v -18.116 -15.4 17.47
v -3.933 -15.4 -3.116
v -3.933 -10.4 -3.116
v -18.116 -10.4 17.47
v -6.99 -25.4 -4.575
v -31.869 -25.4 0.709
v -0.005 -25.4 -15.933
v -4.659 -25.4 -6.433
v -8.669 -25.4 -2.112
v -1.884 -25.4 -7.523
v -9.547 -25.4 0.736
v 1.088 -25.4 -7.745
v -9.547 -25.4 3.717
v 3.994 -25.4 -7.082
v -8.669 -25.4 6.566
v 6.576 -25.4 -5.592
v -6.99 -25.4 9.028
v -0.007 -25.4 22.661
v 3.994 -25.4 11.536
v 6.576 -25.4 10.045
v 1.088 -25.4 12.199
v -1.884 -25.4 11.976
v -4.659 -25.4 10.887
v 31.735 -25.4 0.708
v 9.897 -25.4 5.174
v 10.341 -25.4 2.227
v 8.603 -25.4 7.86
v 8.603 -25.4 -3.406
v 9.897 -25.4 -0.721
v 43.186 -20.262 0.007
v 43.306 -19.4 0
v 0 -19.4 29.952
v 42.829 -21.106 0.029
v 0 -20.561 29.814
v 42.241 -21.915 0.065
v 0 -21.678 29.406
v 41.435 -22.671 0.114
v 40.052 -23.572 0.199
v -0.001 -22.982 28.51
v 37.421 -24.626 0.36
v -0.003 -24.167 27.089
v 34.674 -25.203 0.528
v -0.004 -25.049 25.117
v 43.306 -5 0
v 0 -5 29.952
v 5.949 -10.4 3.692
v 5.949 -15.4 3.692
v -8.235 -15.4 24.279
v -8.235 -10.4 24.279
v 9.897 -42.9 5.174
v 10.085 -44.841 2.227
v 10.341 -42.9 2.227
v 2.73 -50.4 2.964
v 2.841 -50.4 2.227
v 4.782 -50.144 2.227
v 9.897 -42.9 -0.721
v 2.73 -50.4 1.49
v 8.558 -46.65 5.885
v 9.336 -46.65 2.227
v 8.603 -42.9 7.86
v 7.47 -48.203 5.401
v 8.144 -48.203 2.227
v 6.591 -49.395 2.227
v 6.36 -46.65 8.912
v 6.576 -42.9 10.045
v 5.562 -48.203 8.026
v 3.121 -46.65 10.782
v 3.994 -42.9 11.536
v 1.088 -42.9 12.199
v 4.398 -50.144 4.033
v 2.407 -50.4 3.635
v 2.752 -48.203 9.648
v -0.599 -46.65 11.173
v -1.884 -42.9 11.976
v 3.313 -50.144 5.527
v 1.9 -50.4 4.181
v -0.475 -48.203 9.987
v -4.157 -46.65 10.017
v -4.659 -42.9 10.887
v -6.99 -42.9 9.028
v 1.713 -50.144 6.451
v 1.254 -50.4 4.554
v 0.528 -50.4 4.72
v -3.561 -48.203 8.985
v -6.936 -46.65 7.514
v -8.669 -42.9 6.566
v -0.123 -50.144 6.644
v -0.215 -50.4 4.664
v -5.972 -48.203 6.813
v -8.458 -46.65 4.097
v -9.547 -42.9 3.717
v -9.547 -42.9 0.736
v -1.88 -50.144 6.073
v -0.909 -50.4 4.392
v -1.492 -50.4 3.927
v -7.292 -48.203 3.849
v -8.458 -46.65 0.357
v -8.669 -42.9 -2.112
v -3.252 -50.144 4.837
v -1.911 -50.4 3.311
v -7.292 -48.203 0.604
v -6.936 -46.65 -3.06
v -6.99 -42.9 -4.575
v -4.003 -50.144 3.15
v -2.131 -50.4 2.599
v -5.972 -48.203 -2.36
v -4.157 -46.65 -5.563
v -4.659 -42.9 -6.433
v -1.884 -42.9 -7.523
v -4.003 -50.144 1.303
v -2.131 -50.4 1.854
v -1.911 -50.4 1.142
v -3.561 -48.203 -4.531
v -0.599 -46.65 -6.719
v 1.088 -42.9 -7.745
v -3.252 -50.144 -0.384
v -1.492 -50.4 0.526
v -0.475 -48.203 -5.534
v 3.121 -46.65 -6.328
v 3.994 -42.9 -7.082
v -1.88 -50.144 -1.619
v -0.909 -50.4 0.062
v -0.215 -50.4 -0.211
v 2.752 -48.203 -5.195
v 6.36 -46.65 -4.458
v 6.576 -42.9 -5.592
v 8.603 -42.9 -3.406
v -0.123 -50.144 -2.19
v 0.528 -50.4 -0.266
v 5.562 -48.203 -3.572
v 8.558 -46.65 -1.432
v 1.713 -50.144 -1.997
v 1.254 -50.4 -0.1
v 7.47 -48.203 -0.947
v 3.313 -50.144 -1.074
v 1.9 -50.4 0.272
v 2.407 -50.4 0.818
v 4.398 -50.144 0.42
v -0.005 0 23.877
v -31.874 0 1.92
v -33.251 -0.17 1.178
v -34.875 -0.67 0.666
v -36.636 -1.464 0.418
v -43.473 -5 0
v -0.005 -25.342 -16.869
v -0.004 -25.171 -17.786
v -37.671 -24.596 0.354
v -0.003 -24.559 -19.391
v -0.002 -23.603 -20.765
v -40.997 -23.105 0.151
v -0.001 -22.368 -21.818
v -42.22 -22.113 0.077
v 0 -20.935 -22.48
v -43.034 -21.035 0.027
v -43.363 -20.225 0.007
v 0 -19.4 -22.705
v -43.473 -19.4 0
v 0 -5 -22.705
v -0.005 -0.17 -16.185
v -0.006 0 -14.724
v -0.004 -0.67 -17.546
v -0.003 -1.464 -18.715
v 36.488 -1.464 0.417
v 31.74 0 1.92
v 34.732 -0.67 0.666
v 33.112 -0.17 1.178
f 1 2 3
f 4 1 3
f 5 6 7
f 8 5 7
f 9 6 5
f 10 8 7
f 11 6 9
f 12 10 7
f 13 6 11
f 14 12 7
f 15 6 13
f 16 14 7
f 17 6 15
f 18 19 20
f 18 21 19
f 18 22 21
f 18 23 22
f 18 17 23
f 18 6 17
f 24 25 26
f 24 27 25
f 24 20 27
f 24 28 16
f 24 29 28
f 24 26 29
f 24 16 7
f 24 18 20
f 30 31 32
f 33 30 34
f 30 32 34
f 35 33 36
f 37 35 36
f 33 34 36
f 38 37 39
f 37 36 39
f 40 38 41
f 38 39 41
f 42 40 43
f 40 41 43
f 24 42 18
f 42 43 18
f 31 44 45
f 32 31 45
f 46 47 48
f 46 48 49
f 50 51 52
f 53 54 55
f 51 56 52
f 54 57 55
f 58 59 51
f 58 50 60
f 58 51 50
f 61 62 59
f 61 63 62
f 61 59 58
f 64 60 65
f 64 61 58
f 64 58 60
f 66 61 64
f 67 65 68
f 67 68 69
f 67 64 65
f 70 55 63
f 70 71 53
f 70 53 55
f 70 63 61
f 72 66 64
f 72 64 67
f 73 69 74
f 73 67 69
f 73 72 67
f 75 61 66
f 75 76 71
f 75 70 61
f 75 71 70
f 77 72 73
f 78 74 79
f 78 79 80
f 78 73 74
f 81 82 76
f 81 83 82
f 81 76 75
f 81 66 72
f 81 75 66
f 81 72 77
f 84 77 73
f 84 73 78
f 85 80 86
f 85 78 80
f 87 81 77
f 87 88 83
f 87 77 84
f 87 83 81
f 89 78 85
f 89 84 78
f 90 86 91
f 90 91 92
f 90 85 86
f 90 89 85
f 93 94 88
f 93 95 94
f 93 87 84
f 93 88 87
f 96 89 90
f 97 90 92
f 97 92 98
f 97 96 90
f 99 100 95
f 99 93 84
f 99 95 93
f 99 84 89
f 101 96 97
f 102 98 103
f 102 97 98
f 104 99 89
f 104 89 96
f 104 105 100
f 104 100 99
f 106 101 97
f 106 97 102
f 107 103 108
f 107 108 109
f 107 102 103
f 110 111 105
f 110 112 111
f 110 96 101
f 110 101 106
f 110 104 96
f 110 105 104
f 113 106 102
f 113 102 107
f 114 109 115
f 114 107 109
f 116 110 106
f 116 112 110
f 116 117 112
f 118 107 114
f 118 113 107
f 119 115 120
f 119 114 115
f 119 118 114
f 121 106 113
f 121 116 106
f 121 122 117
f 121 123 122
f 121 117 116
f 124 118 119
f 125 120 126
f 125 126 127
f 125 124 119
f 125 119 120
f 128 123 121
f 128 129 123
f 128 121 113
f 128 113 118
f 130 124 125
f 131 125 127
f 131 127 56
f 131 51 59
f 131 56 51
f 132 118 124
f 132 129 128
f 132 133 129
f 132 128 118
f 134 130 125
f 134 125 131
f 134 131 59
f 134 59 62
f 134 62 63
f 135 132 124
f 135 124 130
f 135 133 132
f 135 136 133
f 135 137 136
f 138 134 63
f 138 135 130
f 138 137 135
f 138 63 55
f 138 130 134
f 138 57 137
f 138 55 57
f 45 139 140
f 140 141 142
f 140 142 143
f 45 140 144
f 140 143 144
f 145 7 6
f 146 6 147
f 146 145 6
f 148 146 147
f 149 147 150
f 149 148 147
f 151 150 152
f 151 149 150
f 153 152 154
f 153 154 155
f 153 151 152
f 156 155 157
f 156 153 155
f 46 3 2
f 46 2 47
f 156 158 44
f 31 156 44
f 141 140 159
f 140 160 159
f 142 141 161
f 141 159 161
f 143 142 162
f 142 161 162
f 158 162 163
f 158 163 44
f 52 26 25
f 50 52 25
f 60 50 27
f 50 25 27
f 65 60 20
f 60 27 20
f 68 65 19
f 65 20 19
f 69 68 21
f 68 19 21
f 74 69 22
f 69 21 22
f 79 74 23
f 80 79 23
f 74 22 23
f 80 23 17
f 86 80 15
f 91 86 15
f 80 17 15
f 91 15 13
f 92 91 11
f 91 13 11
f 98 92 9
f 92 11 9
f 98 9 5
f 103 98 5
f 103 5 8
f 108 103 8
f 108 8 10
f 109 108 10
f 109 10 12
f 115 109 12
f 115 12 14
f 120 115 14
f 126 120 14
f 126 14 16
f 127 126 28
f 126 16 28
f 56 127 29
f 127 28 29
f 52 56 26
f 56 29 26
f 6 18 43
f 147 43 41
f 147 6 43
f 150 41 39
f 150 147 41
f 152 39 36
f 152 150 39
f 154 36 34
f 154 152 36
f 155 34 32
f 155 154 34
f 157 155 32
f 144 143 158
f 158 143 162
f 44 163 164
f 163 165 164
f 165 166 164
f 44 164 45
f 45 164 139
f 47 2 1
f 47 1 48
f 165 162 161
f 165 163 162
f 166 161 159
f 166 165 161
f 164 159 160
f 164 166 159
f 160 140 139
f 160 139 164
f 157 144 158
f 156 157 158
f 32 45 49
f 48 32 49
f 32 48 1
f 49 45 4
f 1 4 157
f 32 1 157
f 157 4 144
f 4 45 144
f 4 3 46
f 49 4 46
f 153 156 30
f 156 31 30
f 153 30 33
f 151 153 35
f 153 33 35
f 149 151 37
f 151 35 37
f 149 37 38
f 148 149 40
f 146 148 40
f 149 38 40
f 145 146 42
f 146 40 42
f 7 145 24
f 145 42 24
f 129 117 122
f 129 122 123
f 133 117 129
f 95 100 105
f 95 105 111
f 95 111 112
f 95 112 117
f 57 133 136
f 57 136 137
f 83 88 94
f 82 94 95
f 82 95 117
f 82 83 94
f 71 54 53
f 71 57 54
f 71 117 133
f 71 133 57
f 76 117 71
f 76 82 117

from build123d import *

# Parameters (mm, degrees)
F1_DEPTH = 25.4
F2_SIZE  = 5
F3_R     = 6
F4_W     = 12
F4_H     = 5
F5_DEPTH = 25
F6_R     = 5
F7_R     = 10
F8_DEPTH = 25
F9_R     = 7.5


with BuildPart() as f1:
    # F0 (on Front) → F1 (new body)
    with BuildSketch(Plane.XZ):
        Polygon((43.3064028621, 0), (0, 29.9521442503), (-43.4733256698, 0), (0, -22.7049794048), align=None)
    extrude(amount=F1_DEPTH)

    # F2
    f2_edges = [f1.edges().sort_by_distance(p)[0] for p in [
        (-21.736663, 0, 14.976072),
        (-21.736663, 0, -11.35249),
        (21.653201, 0, -11.35249),
        (21.653201, 0, 14.976072),
    ]]
    chamfer(f2_edges, length=F2_SIZE)

    # F3
    f3_edges = [f1.edges().sort_by_distance(p)[0] for p in [
        (-21.736663, -25.4, 14.976072),
        (21.653201, -25.4, 14.976072),
        (21.653201, -25.4, -11.35249),
        (-21.736663, -25.4, -11.35249),
    ]]
    fillet(f3_edges, radius=F3_R)

    # F4 (on face) → F5 (cut)
    with BuildSketch(Plane(origin=(-13.9936893699, 0, 20.3108068062), x_dir=(0.8234735009, 0, 0.5673547332), z_dir=(-0.5673547332, 0, 0.8234735009))):
        with Locations((0.9934908095, -12.9)):
            Rectangle(F4_W, F4_H)
    extrude(amount=-F5_DEPTH, mode=Mode.SUBTRACT)

    # F6
    f6_edges = [f1.edges().sort_by_distance(p)[0] for p in [
        (-16.903935, 0, -8.235641),
        (16.829559, 0, -8.23594),
    ]]
    fillet(f6_edges, radius=F6_R)

    # F7 (on face) → F8 (join)
    with BuildSketch(Plane.XZ.offset(25.4)):
        with Locations((0.3409804194, 2.2267708555)):
            Circle(F7_R)
    extrude(amount=F8_DEPTH)

    # F9
    f9_edges = [f1.edges().sort_by_distance(p)[0] for p in [
        (-9.65902, -50.4, 2.226771),
    ]]
    fillet(f9_edges, radius=F9_R)


solid = f1.part
